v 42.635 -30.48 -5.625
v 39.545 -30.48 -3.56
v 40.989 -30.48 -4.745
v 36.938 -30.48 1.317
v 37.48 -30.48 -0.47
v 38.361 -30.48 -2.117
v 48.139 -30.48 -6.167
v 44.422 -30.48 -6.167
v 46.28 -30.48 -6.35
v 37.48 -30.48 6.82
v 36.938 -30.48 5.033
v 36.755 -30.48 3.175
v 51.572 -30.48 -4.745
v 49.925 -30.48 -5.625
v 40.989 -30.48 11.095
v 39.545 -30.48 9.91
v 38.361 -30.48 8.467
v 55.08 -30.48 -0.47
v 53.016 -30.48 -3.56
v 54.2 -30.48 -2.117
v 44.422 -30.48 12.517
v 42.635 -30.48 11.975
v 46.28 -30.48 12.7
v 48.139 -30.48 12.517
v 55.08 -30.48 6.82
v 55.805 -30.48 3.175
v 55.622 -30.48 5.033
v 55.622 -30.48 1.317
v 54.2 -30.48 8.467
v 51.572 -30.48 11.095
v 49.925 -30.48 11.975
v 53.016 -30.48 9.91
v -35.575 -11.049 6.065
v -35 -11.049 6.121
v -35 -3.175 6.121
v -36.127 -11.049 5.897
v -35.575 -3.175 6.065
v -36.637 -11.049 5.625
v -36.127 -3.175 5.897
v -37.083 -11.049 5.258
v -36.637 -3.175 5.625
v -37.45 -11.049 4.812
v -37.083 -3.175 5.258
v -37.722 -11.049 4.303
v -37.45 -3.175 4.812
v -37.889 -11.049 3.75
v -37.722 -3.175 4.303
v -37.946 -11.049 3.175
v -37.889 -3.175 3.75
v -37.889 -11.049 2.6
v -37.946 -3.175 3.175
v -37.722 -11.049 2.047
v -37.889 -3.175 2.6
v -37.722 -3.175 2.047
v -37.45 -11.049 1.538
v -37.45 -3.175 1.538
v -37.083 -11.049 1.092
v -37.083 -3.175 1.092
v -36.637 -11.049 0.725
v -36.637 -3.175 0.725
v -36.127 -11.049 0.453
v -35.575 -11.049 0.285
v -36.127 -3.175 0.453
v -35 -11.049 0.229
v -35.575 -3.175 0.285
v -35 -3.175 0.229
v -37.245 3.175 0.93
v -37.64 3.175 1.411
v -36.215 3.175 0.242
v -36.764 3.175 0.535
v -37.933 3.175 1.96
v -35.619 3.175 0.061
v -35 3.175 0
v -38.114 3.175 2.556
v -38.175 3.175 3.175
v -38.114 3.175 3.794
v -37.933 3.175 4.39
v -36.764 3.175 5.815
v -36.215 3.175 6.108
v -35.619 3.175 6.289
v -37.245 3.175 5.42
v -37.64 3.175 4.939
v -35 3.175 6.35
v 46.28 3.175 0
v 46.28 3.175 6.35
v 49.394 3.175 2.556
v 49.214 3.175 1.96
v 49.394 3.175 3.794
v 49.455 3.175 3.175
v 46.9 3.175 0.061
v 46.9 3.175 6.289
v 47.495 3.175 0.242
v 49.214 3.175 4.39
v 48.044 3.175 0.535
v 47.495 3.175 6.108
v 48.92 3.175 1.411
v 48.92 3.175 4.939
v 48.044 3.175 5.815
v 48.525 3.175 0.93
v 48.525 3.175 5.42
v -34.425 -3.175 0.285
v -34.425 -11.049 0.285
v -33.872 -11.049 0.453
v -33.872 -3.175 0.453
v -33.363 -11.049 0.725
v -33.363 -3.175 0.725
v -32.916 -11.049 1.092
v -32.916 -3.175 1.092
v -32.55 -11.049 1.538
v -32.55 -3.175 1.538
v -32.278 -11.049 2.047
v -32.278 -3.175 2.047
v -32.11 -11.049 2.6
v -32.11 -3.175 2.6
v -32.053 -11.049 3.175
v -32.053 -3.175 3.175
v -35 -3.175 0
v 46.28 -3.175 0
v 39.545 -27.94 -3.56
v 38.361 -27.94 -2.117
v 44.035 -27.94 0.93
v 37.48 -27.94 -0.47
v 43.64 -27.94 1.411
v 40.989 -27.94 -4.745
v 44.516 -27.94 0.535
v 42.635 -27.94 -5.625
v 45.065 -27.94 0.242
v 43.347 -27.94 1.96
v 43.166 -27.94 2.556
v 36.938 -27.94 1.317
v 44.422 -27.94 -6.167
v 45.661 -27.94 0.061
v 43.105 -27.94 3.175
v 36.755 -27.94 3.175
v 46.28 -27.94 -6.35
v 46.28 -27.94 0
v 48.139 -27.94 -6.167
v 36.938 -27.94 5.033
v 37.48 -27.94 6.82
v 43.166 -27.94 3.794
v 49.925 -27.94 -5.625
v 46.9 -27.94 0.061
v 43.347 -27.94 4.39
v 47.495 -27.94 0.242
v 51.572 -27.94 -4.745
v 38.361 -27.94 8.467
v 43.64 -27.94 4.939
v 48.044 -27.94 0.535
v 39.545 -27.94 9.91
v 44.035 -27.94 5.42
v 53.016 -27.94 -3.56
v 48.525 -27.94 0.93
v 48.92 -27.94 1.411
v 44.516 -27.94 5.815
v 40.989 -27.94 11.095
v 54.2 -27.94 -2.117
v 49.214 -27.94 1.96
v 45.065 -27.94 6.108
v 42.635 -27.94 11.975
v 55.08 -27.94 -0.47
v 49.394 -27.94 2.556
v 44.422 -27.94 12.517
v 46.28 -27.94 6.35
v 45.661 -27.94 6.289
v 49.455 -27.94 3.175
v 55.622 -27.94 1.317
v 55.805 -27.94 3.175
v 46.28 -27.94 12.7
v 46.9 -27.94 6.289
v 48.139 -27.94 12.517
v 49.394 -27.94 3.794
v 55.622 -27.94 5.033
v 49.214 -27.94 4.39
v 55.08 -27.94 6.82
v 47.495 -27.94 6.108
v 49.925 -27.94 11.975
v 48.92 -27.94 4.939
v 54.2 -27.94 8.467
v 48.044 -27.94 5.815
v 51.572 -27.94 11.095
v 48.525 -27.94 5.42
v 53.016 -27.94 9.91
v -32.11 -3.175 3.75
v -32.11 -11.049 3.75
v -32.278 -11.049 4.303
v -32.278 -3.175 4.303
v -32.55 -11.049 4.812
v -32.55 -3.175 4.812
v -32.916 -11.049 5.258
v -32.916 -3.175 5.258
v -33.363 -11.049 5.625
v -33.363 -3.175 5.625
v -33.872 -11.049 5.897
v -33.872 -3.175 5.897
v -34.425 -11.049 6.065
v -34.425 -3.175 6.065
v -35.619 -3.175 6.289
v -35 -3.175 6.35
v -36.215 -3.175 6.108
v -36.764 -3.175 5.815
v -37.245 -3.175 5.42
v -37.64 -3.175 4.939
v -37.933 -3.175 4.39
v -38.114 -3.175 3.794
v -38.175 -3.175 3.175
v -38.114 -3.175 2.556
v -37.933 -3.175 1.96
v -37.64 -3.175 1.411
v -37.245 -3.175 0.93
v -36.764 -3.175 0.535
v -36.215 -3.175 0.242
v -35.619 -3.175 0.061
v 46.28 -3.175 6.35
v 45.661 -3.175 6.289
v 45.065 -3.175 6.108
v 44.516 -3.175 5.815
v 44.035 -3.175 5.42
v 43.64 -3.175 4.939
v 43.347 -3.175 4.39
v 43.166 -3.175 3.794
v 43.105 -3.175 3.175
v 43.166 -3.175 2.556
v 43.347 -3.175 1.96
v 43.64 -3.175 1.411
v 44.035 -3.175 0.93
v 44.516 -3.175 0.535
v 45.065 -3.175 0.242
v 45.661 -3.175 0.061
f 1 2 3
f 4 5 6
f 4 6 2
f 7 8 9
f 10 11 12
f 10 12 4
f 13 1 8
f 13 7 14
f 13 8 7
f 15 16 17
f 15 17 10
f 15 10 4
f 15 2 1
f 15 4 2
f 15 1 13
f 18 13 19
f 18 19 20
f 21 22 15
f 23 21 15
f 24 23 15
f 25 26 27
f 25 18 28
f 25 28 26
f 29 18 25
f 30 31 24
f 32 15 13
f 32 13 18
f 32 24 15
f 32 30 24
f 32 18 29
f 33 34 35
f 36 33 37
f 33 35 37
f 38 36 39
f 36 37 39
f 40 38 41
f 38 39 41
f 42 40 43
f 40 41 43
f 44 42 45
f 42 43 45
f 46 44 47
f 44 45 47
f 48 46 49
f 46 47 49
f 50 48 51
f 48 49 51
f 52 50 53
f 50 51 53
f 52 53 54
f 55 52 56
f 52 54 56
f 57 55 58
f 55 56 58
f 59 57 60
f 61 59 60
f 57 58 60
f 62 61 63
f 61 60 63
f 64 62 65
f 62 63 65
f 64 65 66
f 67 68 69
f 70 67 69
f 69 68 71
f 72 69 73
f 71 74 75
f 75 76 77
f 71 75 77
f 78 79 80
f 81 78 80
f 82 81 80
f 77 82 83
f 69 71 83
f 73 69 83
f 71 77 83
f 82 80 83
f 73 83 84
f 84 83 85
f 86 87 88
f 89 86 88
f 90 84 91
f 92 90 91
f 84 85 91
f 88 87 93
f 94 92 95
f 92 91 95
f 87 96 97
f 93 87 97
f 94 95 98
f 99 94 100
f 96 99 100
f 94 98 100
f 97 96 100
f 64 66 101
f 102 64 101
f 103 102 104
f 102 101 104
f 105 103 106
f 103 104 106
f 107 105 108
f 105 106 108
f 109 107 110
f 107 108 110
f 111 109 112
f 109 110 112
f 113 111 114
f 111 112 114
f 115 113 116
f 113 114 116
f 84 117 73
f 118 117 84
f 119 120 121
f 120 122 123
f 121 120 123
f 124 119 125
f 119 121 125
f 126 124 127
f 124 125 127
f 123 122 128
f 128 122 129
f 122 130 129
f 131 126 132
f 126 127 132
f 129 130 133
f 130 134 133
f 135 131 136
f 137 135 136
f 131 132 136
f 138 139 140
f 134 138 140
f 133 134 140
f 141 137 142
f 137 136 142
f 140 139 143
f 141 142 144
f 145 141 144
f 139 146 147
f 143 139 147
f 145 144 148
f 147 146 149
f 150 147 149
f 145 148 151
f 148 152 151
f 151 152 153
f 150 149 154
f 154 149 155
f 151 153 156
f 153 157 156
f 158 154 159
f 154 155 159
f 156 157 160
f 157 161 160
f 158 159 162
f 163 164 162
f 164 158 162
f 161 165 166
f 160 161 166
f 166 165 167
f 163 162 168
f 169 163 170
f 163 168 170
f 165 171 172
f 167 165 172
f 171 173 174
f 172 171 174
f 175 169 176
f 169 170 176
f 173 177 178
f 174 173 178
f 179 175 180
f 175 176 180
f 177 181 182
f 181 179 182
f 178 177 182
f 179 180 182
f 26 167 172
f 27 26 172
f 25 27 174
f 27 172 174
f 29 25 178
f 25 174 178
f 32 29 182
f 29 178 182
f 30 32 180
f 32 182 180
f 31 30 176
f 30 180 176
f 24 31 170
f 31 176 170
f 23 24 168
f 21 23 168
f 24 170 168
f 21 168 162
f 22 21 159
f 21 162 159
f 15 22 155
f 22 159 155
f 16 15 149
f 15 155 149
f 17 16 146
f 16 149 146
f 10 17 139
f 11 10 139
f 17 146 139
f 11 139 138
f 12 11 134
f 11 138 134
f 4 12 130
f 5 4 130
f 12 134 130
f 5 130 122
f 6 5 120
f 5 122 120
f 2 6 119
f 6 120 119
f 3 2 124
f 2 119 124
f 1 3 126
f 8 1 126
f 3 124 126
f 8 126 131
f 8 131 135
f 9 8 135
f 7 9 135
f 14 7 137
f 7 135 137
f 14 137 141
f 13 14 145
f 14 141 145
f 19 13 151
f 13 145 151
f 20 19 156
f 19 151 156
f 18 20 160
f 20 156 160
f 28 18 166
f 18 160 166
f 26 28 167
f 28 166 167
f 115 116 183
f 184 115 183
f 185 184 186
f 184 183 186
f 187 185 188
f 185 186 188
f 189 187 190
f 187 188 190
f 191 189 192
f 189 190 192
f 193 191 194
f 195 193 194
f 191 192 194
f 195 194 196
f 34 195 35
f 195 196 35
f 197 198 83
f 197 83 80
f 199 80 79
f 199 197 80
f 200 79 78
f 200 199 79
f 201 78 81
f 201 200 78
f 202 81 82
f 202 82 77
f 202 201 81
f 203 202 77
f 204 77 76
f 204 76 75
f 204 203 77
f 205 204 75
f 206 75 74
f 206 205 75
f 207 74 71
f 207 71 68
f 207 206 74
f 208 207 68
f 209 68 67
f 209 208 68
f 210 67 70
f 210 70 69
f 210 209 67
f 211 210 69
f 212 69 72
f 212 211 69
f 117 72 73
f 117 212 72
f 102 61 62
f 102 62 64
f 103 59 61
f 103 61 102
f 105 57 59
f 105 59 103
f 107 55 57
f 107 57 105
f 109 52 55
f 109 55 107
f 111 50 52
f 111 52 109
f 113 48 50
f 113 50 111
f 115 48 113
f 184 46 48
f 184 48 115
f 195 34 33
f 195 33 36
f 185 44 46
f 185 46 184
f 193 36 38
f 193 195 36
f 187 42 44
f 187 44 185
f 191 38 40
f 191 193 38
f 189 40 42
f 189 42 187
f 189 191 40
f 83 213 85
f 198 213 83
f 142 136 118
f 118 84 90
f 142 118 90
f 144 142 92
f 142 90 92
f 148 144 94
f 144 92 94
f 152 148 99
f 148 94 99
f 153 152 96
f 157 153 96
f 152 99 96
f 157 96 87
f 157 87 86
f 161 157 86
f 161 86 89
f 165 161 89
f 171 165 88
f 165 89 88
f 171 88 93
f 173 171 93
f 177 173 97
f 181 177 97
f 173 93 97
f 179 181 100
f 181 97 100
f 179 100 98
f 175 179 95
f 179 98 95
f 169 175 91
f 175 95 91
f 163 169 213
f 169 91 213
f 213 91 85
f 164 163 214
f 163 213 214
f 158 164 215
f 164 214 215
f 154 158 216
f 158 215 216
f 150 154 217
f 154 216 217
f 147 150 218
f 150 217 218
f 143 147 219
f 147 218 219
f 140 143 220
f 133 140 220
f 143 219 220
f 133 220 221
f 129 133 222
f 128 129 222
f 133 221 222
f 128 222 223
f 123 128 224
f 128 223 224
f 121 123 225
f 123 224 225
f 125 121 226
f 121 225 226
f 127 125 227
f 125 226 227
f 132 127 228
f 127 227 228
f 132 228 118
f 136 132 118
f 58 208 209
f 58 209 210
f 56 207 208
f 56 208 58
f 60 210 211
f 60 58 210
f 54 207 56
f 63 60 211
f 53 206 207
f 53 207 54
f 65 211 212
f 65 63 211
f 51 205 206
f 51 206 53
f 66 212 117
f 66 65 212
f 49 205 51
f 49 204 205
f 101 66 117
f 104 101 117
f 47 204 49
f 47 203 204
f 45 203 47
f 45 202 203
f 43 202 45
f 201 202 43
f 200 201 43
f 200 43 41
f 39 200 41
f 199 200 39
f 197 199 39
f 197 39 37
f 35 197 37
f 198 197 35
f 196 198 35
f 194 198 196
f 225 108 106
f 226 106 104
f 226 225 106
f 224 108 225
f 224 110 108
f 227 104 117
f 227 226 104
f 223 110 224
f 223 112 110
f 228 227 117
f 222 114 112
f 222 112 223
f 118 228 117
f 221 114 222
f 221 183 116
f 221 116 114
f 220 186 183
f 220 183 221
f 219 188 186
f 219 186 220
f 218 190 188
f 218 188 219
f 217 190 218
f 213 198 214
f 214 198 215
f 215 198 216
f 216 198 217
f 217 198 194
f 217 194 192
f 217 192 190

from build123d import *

# Parameters (mm, degrees)
F1_DEPTH = 11.049
F2_DEPTH = 27.94
F3_DEPTH = 3.175
F4_R     = 9.525
F5_DEPTH = 2.54


with BuildPart() as f1:
    # F0 (on Front) → F1 (new body)
    with BuildSketch(Plane.XZ):
        with BuildLine():
            ThreePointArc((-32.0532864205, 3.175), (-32.9162675396, 5.2584207218), (-34.9996882613, 6.1214018409))
            Line((-34.9996882613, 6.1214018409), (-34.9996882613, 0.2285981591))
            ThreePointArc((-34.9996882613, 0.2285981591), (-32.9162675396, 1.0915792782), (-32.0532864205, 3.175))
        make_face()
        with BuildLine():
            Line((-34.9996882613, 0.2285981591), (-34.9996882613, 6.1214018409))
            ThreePointArc((-34.9996882613, 6.1214018409), (-37.9460901022, 3.175), (-34.9996882613, 0.2285981591))
        make_face()
    extrude(amount=F1_DEPTH)



with BuildPart() as f2:
    # F0 (on Front) → F2 (new body)
    with BuildSketch(Plane.XZ):
        with BuildLine():
            Line((46.2803117387, 0), (46.2803117387, 6.35))
            ThreePointArc((46.2803117387, 6.35), (43.1053117387, 3.175), (46.2803117387, 0))
        make_face()
        with BuildLine():
            ThreePointArc((49.4553117387, 3.175), (48.5253757689, 5.4200640303), (46.2803117387, 6.35))
            Line((46.2803117387, 6.35), (46.2803117387, 0))
            ThreePointArc((46.2803117387, 0), (48.5253757689, 0.9299359697), (49.4553117387, 3.175))
        make_face()
    extrude(amount=F2_DEPTH)


with BuildPart() as f1_1:
    add(f1.part)

    add(f2.part)  # F3 merges F2
    # F0 (on Front) → F3 (join, symmetric)
    with BuildSketch(Plane.XZ):
        with BuildLine():
            Line((46.2803117387, 6.35), (-34.9996882613, 6.35))
            ThreePointArc((-34.9996882613, 6.35), (-32.7546242311, 5.4200640303), (-31.8246882613, 3.175))
            ThreePointArc((-31.8246882613, 3.175), (-32.7546242311, 0.9299359697), (-34.9996882613, 0))
            Line((-34.9996882613, 0), (46.2803117387, 0))
            ThreePointArc((46.2803117387, 0), (43.1053117387, 3.175), (46.2803117387, 6.35))
        make_face()
        with BuildLine():
            Line((-34.9996882613, 6.1214018409), (-34.9996882613, 6.35))
            ThreePointArc((-34.9996882613, 6.35), (-38.1746882613, 3.175), (-34.9996882613, 0))
            Line((-34.9996882613, 0), (-34.9996882613, 0.2285981591))
            ThreePointArc((-34.9996882613, 0.2285981591), (-37.9460901022, 3.175), (-34.9996882613, 6.1214018409))
        make_face()
        with BuildLine():
            ThreePointArc((-31.8246882613, 3.175), (-32.7546242311, 5.4200640303), (-34.9996882613, 6.35))
            Line((-34.9996882613, 6.35), (-34.9996882613, 6.1214018409))
            ThreePointArc((-34.9996882613, 6.1214018409), (-32.9162675396, 5.2584207218), (-32.0532864205, 3.175))
            ThreePointArc((-32.0532864205, 3.175), (-32.9162675396, 1.0915792782), (-34.9996882613, 0.2285981591))
            Line((-34.9996882613, 0.2285981591), (-34.9996882613, 0))
            ThreePointArc((-34.9996882613, 0), (-32.7546242311, 0.9299359697), (-31.8246882613, 3.175))
        make_face()
        with BuildLine():
            ThreePointArc((49.4553117387, 3.175), (48.5253757689, 5.4200640303), (46.2803117387, 6.35))
            Line((46.2803117387, 6.35), (46.2803117387, 0))
            ThreePointArc((46.2803117387, 0), (48.5253757689, 0.9299359697), (49.4553117387, 3.175))
        make_face()
        with BuildLine():
            Line((46.2803117387, 0), (46.2803117387, 6.35))
            ThreePointArc((46.2803117387, 6.35), (43.1053117387, 3.175), (46.2803117387, 0))
        make_face()
        with BuildLine():
            Line((-34.9996882613, 0.2285981591), (-34.9996882613, 6.1214018409))
            ThreePointArc((-34.9996882613, 6.1214018409), (-37.9460901022, 3.175), (-34.9996882613, 0.2285981591))
        make_face()
        with BuildLine():
            ThreePointArc((-32.0532864205, 3.175), (-32.9162675396, 5.2584207218), (-34.9996882613, 6.1214018409))
            Line((-34.9996882613, 6.1214018409), (-34.9996882613, 0.2285981591))
            ThreePointArc((-34.9996882613, 0.2285981591), (-32.9162675396, 1.0915792782), (-32.0532864205, 3.175))
        make_face()
    extrude(amount=F3_DEPTH, both=True)

    # F4 (on face) → F5 (join)
    with BuildSketch(Plane.XZ.offset(27.94)):
        with Locations((46.2803117387, 3.175)):
            Circle(F4_R)
        with BuildLine():
            ThreePointArc((46.2803117387, 6.35), (48.5253757689, 5.4200640303), (49.4553117387, 3.175))
            ThreePointArc((49.4553117387, 3.175), (44.0352477084, 0.9299359697), (46.2803117387, 6.35))
        make_face(mode=Mode.SUBTRACT)
        with BuildLine():
            ThreePointArc((46.2803117387, 6.35), (44.0352477084, 0.9299359697), (49.4553117387, 3.175))
            ThreePointArc((49.4553117387, 3.175), (48.5253757689, 5.4200640303), (46.2803117387, 6.35))
        make_face()
    extrude(amount=F5_DEPTH)


solid = f1_1.part
